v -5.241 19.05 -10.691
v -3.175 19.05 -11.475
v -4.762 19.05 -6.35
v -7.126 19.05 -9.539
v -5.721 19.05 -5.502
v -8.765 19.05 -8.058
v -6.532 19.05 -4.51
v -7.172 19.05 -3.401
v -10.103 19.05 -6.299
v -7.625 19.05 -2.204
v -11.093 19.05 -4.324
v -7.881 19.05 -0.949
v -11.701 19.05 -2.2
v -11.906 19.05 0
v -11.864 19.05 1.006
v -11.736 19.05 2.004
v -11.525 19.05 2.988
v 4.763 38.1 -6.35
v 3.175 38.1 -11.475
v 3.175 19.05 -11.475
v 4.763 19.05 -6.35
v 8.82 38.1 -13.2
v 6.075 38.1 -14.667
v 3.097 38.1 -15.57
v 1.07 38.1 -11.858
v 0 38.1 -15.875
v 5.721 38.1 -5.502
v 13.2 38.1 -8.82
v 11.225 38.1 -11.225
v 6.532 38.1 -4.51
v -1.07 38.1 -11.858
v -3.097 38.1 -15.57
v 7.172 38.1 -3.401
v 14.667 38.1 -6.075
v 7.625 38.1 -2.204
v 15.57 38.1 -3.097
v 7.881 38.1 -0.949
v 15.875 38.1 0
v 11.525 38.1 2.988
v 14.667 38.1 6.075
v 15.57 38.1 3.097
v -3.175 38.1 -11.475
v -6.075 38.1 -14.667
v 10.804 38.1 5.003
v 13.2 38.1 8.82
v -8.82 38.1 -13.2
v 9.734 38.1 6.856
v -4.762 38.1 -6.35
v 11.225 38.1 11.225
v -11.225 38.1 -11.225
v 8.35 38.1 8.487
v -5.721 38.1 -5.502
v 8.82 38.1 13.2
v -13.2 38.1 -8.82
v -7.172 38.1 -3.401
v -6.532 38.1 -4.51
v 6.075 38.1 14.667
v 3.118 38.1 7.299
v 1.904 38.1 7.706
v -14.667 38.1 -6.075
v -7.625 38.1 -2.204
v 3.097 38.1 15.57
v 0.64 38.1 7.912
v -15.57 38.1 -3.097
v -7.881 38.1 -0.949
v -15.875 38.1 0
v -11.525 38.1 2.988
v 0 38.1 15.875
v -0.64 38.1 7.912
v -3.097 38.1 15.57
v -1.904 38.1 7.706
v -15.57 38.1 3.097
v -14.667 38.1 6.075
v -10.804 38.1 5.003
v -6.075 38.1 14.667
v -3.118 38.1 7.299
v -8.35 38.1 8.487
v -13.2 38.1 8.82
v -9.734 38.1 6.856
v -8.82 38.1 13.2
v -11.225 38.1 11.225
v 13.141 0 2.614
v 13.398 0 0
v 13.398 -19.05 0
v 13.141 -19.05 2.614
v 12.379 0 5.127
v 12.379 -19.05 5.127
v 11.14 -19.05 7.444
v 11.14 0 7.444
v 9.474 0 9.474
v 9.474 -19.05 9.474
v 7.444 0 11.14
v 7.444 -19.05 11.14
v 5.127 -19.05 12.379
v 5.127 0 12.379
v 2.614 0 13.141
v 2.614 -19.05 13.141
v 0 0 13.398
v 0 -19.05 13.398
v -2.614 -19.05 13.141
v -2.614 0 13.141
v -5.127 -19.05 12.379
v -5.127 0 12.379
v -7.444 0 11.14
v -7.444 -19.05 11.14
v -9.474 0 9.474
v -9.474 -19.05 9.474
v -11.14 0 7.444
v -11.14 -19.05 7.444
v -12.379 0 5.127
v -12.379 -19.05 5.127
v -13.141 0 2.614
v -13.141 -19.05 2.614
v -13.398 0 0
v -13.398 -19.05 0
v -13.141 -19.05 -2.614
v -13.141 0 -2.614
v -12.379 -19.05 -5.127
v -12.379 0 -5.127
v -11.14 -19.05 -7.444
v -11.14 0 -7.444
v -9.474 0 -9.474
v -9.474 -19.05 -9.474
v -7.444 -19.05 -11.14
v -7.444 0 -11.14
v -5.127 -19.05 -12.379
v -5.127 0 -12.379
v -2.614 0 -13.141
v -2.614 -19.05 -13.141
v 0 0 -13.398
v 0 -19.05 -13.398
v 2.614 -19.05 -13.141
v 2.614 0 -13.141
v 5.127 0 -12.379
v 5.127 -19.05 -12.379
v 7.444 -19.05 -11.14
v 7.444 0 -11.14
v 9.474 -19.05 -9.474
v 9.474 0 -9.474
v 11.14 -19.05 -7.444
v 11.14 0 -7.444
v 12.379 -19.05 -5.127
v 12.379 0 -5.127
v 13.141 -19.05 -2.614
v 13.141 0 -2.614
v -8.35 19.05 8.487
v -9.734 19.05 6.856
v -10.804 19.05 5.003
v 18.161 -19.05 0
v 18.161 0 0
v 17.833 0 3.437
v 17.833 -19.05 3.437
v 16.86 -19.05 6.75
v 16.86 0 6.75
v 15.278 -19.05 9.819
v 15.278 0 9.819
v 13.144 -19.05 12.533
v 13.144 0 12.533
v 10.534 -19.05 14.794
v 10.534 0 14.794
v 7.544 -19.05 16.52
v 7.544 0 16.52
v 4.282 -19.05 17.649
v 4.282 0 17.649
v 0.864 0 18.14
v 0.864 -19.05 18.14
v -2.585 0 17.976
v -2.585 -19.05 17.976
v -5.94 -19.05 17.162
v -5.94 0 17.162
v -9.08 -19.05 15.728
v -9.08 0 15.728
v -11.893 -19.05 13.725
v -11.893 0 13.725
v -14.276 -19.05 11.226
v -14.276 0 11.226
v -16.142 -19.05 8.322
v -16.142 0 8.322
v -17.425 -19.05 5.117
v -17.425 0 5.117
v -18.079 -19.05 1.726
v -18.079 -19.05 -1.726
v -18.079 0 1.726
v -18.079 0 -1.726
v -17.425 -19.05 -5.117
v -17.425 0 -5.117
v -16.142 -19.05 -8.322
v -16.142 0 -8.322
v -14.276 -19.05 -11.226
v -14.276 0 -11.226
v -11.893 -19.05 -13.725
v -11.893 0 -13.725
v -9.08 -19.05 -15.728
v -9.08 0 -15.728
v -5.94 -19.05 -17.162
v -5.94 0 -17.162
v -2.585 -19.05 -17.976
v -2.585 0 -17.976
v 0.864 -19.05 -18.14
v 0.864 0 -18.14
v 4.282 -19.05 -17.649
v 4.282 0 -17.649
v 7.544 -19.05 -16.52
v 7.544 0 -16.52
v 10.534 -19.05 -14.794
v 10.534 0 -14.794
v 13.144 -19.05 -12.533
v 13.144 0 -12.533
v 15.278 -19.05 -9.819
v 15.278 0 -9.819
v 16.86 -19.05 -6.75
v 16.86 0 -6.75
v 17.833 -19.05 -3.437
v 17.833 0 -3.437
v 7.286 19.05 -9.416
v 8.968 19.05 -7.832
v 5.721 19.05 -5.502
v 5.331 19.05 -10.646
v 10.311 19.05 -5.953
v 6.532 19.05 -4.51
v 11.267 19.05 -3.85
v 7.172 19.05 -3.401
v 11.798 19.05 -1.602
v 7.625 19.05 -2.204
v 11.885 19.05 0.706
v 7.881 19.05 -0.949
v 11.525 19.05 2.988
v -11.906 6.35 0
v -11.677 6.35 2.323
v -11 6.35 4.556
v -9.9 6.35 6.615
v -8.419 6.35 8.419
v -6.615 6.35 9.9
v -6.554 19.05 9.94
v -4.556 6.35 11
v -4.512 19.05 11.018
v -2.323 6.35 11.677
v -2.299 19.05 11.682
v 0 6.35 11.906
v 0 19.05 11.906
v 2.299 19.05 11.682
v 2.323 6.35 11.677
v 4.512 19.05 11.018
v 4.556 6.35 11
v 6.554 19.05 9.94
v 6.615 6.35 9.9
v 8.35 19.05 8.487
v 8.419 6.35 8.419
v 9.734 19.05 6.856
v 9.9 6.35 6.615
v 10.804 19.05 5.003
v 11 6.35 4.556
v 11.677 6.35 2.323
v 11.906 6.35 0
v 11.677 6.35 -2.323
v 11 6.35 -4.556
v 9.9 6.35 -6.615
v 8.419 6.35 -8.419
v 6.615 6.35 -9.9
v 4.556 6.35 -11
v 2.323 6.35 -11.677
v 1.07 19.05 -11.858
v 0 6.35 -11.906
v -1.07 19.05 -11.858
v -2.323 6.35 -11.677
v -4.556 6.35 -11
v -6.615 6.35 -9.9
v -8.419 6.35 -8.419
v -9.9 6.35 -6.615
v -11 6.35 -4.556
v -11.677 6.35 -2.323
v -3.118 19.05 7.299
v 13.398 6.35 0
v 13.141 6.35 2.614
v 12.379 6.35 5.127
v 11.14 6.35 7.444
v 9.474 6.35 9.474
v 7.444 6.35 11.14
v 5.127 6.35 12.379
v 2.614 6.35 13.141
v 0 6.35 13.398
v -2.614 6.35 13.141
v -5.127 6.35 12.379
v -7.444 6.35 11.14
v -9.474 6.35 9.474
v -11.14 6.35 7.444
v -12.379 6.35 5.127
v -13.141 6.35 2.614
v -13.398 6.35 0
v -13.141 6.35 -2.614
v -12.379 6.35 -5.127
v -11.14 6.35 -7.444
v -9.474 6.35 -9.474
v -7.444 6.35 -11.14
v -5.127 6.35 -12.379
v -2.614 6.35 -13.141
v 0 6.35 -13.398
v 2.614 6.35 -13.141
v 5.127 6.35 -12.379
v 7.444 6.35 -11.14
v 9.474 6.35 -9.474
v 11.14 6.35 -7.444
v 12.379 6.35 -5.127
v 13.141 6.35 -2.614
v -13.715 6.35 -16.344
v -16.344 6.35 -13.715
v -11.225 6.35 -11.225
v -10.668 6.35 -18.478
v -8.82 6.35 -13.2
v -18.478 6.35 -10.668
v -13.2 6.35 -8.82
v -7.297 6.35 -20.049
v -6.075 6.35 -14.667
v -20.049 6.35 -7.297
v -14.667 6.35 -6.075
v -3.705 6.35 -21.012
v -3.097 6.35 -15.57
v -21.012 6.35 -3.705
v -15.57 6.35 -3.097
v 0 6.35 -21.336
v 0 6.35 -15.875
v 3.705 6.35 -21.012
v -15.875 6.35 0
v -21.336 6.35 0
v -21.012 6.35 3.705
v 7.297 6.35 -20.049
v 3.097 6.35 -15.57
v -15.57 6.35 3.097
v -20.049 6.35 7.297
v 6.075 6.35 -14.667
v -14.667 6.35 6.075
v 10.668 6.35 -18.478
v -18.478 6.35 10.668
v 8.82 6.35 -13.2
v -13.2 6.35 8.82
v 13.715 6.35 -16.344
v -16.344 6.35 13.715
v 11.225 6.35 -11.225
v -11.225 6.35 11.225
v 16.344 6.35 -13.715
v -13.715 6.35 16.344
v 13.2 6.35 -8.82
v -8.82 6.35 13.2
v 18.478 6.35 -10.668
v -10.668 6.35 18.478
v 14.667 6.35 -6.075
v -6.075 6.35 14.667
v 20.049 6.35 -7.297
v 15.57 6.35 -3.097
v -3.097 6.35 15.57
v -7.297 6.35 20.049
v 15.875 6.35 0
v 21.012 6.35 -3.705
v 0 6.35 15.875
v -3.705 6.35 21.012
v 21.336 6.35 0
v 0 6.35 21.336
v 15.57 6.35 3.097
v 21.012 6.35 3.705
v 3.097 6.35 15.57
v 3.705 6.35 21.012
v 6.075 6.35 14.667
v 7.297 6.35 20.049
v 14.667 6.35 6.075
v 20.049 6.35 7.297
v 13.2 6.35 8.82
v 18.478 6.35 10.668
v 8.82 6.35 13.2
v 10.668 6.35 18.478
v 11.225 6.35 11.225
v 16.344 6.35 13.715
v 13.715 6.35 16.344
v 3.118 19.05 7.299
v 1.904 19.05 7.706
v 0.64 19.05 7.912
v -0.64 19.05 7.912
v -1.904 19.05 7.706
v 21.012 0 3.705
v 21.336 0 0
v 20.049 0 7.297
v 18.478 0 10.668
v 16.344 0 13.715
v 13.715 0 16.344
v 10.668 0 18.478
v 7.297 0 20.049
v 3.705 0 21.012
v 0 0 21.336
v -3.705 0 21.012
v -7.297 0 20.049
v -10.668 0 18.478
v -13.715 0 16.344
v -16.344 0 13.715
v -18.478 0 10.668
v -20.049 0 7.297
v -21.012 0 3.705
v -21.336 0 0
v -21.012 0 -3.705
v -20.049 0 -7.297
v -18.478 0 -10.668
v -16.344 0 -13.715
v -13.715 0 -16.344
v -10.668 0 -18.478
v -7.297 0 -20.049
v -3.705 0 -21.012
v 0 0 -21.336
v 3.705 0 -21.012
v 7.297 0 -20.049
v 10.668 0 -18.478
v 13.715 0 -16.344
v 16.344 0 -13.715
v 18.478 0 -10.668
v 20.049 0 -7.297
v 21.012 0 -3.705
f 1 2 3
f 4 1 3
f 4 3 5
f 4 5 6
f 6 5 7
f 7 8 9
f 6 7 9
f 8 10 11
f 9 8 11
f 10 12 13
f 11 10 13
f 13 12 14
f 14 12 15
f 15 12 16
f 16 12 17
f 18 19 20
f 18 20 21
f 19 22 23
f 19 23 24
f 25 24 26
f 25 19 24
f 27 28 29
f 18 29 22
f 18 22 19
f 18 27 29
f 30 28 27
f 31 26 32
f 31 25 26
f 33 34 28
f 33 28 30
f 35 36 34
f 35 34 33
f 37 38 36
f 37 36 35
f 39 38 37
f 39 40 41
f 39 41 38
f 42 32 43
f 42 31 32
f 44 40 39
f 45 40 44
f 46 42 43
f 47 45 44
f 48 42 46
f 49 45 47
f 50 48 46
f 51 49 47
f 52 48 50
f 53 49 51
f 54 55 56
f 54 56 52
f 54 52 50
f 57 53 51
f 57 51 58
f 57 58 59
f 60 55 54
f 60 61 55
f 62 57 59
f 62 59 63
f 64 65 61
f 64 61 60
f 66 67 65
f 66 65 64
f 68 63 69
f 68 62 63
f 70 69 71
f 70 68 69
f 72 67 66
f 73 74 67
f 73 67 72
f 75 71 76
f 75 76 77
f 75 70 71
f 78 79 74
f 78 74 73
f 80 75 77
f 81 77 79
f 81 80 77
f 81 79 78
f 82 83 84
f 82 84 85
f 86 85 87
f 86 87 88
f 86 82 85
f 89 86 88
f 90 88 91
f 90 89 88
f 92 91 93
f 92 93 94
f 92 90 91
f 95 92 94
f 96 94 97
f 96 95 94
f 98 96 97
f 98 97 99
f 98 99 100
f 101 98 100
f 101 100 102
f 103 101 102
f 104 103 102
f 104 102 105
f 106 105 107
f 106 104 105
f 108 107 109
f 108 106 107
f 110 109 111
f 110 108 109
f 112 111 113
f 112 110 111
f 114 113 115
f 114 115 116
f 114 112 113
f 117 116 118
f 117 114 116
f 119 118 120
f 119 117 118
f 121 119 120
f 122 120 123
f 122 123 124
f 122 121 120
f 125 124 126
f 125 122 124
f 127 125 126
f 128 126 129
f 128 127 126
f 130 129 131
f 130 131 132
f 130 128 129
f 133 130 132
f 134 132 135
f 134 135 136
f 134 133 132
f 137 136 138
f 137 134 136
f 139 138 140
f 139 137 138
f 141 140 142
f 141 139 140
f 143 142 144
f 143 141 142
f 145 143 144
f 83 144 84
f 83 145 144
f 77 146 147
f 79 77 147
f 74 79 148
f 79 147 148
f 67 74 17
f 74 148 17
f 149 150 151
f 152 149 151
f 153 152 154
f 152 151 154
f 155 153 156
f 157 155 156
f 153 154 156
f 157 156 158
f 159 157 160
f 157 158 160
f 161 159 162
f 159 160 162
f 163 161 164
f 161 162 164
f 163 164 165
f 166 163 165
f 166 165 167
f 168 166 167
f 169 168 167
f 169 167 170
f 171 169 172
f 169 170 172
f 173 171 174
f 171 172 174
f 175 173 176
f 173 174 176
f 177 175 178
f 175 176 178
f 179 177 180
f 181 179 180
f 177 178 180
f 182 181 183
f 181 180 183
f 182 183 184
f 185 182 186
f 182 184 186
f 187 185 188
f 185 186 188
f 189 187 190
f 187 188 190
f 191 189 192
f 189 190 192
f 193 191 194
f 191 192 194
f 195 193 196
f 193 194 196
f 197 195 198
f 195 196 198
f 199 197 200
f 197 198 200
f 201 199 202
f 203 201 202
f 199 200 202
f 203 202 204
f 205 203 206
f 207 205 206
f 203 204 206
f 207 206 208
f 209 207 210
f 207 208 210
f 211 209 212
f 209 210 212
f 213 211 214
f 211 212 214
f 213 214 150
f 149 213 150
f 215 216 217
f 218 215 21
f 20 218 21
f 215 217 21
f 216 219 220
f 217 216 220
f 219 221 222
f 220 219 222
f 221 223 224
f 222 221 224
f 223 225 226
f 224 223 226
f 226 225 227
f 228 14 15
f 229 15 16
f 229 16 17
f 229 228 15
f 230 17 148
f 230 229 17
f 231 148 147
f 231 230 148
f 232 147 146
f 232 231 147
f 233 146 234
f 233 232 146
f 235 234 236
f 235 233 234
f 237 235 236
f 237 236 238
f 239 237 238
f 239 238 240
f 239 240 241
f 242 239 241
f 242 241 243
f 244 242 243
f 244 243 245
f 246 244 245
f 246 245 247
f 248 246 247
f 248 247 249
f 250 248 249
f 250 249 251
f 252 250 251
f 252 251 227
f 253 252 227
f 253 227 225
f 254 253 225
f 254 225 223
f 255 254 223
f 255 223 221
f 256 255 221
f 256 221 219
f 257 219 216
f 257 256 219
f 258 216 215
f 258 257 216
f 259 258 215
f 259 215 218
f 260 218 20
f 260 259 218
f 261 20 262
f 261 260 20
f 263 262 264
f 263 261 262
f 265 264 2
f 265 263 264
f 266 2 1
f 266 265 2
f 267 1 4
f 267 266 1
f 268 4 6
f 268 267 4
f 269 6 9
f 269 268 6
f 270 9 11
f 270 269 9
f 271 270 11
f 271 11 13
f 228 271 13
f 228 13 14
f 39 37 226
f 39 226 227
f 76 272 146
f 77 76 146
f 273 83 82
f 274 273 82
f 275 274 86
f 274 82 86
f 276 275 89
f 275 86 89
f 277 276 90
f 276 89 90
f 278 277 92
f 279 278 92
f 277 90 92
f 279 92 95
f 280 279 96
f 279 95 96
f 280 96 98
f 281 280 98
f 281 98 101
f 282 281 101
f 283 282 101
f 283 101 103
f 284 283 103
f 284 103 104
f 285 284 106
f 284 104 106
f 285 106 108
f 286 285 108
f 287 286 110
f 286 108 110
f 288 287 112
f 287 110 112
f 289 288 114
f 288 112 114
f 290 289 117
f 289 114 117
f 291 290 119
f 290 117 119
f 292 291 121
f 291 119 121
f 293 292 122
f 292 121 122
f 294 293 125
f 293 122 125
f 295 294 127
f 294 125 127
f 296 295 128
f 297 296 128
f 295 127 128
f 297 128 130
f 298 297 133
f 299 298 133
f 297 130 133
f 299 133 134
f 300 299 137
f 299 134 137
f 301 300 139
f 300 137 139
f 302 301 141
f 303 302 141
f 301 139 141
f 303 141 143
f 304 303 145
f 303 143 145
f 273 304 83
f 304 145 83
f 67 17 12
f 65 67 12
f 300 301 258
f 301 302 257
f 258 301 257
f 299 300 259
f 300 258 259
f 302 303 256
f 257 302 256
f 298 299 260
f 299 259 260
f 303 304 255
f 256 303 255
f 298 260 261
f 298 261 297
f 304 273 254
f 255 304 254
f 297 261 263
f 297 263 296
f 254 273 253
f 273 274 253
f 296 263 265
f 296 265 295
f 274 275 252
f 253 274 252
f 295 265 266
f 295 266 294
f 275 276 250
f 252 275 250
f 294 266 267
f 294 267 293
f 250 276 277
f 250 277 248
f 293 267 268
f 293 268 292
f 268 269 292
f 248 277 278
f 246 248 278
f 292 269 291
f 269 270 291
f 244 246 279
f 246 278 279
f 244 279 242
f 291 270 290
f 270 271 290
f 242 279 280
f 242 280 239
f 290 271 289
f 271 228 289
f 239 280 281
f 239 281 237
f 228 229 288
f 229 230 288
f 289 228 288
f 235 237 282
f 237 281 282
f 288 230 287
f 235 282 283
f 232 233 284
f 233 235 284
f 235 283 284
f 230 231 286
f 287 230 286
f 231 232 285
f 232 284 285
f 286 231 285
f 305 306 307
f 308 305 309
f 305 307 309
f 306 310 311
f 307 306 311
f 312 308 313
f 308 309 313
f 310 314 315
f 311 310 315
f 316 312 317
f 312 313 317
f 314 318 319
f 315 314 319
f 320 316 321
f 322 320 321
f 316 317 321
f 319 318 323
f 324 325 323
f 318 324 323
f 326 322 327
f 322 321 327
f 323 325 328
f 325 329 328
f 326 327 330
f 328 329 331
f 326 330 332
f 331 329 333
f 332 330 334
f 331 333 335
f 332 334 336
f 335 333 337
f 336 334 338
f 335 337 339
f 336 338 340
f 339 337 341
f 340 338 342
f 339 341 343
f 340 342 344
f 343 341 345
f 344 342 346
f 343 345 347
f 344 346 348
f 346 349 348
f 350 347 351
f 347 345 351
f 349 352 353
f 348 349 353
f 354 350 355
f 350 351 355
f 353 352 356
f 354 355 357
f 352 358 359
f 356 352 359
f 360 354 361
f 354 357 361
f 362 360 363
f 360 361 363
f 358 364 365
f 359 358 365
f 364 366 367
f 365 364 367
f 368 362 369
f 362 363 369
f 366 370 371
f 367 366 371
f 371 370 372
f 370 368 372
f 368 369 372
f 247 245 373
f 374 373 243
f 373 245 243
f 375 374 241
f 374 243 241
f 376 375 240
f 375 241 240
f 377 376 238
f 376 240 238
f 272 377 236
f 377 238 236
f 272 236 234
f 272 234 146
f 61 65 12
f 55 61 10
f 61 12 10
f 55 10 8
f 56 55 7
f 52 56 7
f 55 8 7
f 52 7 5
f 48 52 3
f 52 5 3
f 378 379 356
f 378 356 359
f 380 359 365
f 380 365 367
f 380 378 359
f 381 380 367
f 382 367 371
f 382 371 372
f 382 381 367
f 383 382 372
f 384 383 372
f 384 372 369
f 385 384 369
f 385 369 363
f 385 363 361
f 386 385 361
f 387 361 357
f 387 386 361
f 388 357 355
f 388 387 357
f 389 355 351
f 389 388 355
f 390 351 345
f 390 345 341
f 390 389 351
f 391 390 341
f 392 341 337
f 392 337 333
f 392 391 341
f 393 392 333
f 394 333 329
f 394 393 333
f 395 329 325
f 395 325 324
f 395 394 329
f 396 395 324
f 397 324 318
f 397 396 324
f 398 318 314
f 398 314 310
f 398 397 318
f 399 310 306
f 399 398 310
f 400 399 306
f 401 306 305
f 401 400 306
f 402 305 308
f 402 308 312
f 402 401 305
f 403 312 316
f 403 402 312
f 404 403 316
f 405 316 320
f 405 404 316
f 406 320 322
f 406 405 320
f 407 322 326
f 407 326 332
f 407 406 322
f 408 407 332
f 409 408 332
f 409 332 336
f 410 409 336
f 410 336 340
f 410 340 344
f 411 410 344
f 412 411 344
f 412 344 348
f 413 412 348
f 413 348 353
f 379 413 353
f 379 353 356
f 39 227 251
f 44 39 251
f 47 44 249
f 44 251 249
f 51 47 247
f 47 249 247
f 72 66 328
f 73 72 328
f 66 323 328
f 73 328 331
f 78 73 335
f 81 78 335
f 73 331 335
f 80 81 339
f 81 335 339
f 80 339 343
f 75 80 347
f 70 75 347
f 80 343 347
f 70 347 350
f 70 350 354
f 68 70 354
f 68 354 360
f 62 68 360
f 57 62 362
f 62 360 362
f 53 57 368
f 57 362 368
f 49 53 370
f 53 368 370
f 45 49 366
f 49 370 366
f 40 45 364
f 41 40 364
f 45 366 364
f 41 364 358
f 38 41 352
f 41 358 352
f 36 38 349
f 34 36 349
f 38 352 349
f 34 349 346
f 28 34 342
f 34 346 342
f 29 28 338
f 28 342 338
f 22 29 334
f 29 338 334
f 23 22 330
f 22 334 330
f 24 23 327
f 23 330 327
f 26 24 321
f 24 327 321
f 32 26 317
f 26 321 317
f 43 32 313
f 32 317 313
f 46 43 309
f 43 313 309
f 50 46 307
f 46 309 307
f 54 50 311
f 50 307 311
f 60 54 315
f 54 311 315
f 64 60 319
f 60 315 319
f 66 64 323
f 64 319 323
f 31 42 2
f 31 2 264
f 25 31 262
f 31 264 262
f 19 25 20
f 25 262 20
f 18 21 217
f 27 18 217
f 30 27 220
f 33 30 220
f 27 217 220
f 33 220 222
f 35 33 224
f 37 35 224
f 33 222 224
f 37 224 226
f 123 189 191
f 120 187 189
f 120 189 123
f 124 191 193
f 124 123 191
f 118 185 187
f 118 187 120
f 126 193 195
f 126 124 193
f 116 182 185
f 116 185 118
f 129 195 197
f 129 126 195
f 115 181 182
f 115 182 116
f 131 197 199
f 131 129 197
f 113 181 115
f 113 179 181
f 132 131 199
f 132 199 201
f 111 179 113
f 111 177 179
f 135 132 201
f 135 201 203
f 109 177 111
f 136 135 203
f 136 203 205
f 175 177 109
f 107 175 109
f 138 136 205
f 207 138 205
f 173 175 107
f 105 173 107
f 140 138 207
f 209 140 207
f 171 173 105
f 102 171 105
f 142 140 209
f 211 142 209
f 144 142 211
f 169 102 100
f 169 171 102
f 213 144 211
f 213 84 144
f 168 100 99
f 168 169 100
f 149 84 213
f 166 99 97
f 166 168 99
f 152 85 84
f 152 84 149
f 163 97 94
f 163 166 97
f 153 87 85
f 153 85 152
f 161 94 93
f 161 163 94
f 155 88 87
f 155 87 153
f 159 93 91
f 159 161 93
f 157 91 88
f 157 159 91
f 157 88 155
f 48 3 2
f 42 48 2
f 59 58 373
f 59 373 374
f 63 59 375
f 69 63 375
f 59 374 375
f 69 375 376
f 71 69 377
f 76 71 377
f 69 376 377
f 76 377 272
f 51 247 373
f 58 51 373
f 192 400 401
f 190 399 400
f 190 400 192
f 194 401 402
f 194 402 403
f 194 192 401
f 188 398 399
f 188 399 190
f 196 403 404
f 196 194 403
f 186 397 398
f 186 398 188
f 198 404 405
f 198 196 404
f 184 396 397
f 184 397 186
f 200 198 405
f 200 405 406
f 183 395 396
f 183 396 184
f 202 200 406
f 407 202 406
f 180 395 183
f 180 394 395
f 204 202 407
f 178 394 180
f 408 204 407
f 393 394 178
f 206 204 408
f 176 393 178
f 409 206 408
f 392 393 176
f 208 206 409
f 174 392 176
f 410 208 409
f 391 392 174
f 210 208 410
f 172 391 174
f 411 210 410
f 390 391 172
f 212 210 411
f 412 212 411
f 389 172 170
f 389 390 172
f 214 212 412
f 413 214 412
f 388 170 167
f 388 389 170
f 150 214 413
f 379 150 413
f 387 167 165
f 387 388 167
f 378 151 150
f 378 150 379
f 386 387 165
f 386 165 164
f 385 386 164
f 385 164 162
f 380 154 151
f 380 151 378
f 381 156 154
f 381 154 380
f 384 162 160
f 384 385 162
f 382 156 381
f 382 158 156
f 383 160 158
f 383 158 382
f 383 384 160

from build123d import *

# Parameters (mm, degrees)
F0_R     = 18.161
F0_R_2   = 13.3985
F1_DEPTH = 19.05
F2_R     = 21.336
F2_R_2   = 13.3985
F3_DEPTH = 6.35
F4_R     = 15.875
F4_R_2   = 11.90625
F5_DEPTH = 12.7
F6_R     = 15.875
F7_DEPTH = 19.05


with BuildPart() as f1:
    # F0 (on Front) → F1 (new body)
    with BuildSketch(Plane.XZ):
        Circle(F0_R)
        Circle(F0_R_2, mode=Mode.SUBTRACT)
    extrude(amount=F1_DEPTH)

    # F2 (on Front) → F3 (join)
    with BuildSketch(Plane.XZ):
        Circle(F2_R)
        Circle(F2_R_2, mode=Mode.SUBTRACT)
    extrude(amount=-F3_DEPTH)

    # F4 (on face) → F5 (join)
    with BuildSketch(Plane(origin=(0, 6.35, 0), x_dir=(-1, 0, 0), z_dir=(0, 1, 0))):
        Circle(F4_R)
        Circle(F4_R_2, mode=Mode.SUBTRACT)
    extrude(amount=F5_DEPTH)

    # F6 (on face) → F7 (join)
    with BuildSketch(Plane(origin=(0, 19.05, 0), x_dir=(-1, 0, 0), z_dir=(0, 1, 0))):
        Circle(F6_R)
        with BuildLine():
            ThreePointArc((-4.7625, -6.35), (-6.874077, -3.96875), (-7.880511, -0.949446))
            Line((-7.880511, -0.949446), (-11.525237, 2.987925))
            ThreePointArc((-11.525237, 2.987925), (-10.311115, 5.953125), (-8.350237, 8.487186))
            Line((-8.350237, 8.487186), (-3.118011, 7.299446))
            ThreePointArc((-3.118011, 7.299446), (0, 7.9375), (3.118011, 7.299446))
            Line((3.118011, 7.299446), (8.350237, 8.487186))
            ThreePointArc((8.350237, 8.487186), (10.311115, 5.953125), (11.525237, 2.987925))
            Line((11.525237, 2.987925), (7.880511, -0.949446))
            ThreePointArc((7.880511, -0.949446), (6.874077, -3.96875), (4.7625, -6.35))
            Line((4.7625, -6.35), (3.175, -11.475111))
            ThreePointArc((3.175, -11.475111), (0, -11.90625), (-3.175, -11.475111))
            Line((-3.175, -11.475111), (-4.7625, -6.35))
        make_face(mode=Mode.SUBTRACT)
    extrude(amount=F7_DEPTH)


solid = f1.part
